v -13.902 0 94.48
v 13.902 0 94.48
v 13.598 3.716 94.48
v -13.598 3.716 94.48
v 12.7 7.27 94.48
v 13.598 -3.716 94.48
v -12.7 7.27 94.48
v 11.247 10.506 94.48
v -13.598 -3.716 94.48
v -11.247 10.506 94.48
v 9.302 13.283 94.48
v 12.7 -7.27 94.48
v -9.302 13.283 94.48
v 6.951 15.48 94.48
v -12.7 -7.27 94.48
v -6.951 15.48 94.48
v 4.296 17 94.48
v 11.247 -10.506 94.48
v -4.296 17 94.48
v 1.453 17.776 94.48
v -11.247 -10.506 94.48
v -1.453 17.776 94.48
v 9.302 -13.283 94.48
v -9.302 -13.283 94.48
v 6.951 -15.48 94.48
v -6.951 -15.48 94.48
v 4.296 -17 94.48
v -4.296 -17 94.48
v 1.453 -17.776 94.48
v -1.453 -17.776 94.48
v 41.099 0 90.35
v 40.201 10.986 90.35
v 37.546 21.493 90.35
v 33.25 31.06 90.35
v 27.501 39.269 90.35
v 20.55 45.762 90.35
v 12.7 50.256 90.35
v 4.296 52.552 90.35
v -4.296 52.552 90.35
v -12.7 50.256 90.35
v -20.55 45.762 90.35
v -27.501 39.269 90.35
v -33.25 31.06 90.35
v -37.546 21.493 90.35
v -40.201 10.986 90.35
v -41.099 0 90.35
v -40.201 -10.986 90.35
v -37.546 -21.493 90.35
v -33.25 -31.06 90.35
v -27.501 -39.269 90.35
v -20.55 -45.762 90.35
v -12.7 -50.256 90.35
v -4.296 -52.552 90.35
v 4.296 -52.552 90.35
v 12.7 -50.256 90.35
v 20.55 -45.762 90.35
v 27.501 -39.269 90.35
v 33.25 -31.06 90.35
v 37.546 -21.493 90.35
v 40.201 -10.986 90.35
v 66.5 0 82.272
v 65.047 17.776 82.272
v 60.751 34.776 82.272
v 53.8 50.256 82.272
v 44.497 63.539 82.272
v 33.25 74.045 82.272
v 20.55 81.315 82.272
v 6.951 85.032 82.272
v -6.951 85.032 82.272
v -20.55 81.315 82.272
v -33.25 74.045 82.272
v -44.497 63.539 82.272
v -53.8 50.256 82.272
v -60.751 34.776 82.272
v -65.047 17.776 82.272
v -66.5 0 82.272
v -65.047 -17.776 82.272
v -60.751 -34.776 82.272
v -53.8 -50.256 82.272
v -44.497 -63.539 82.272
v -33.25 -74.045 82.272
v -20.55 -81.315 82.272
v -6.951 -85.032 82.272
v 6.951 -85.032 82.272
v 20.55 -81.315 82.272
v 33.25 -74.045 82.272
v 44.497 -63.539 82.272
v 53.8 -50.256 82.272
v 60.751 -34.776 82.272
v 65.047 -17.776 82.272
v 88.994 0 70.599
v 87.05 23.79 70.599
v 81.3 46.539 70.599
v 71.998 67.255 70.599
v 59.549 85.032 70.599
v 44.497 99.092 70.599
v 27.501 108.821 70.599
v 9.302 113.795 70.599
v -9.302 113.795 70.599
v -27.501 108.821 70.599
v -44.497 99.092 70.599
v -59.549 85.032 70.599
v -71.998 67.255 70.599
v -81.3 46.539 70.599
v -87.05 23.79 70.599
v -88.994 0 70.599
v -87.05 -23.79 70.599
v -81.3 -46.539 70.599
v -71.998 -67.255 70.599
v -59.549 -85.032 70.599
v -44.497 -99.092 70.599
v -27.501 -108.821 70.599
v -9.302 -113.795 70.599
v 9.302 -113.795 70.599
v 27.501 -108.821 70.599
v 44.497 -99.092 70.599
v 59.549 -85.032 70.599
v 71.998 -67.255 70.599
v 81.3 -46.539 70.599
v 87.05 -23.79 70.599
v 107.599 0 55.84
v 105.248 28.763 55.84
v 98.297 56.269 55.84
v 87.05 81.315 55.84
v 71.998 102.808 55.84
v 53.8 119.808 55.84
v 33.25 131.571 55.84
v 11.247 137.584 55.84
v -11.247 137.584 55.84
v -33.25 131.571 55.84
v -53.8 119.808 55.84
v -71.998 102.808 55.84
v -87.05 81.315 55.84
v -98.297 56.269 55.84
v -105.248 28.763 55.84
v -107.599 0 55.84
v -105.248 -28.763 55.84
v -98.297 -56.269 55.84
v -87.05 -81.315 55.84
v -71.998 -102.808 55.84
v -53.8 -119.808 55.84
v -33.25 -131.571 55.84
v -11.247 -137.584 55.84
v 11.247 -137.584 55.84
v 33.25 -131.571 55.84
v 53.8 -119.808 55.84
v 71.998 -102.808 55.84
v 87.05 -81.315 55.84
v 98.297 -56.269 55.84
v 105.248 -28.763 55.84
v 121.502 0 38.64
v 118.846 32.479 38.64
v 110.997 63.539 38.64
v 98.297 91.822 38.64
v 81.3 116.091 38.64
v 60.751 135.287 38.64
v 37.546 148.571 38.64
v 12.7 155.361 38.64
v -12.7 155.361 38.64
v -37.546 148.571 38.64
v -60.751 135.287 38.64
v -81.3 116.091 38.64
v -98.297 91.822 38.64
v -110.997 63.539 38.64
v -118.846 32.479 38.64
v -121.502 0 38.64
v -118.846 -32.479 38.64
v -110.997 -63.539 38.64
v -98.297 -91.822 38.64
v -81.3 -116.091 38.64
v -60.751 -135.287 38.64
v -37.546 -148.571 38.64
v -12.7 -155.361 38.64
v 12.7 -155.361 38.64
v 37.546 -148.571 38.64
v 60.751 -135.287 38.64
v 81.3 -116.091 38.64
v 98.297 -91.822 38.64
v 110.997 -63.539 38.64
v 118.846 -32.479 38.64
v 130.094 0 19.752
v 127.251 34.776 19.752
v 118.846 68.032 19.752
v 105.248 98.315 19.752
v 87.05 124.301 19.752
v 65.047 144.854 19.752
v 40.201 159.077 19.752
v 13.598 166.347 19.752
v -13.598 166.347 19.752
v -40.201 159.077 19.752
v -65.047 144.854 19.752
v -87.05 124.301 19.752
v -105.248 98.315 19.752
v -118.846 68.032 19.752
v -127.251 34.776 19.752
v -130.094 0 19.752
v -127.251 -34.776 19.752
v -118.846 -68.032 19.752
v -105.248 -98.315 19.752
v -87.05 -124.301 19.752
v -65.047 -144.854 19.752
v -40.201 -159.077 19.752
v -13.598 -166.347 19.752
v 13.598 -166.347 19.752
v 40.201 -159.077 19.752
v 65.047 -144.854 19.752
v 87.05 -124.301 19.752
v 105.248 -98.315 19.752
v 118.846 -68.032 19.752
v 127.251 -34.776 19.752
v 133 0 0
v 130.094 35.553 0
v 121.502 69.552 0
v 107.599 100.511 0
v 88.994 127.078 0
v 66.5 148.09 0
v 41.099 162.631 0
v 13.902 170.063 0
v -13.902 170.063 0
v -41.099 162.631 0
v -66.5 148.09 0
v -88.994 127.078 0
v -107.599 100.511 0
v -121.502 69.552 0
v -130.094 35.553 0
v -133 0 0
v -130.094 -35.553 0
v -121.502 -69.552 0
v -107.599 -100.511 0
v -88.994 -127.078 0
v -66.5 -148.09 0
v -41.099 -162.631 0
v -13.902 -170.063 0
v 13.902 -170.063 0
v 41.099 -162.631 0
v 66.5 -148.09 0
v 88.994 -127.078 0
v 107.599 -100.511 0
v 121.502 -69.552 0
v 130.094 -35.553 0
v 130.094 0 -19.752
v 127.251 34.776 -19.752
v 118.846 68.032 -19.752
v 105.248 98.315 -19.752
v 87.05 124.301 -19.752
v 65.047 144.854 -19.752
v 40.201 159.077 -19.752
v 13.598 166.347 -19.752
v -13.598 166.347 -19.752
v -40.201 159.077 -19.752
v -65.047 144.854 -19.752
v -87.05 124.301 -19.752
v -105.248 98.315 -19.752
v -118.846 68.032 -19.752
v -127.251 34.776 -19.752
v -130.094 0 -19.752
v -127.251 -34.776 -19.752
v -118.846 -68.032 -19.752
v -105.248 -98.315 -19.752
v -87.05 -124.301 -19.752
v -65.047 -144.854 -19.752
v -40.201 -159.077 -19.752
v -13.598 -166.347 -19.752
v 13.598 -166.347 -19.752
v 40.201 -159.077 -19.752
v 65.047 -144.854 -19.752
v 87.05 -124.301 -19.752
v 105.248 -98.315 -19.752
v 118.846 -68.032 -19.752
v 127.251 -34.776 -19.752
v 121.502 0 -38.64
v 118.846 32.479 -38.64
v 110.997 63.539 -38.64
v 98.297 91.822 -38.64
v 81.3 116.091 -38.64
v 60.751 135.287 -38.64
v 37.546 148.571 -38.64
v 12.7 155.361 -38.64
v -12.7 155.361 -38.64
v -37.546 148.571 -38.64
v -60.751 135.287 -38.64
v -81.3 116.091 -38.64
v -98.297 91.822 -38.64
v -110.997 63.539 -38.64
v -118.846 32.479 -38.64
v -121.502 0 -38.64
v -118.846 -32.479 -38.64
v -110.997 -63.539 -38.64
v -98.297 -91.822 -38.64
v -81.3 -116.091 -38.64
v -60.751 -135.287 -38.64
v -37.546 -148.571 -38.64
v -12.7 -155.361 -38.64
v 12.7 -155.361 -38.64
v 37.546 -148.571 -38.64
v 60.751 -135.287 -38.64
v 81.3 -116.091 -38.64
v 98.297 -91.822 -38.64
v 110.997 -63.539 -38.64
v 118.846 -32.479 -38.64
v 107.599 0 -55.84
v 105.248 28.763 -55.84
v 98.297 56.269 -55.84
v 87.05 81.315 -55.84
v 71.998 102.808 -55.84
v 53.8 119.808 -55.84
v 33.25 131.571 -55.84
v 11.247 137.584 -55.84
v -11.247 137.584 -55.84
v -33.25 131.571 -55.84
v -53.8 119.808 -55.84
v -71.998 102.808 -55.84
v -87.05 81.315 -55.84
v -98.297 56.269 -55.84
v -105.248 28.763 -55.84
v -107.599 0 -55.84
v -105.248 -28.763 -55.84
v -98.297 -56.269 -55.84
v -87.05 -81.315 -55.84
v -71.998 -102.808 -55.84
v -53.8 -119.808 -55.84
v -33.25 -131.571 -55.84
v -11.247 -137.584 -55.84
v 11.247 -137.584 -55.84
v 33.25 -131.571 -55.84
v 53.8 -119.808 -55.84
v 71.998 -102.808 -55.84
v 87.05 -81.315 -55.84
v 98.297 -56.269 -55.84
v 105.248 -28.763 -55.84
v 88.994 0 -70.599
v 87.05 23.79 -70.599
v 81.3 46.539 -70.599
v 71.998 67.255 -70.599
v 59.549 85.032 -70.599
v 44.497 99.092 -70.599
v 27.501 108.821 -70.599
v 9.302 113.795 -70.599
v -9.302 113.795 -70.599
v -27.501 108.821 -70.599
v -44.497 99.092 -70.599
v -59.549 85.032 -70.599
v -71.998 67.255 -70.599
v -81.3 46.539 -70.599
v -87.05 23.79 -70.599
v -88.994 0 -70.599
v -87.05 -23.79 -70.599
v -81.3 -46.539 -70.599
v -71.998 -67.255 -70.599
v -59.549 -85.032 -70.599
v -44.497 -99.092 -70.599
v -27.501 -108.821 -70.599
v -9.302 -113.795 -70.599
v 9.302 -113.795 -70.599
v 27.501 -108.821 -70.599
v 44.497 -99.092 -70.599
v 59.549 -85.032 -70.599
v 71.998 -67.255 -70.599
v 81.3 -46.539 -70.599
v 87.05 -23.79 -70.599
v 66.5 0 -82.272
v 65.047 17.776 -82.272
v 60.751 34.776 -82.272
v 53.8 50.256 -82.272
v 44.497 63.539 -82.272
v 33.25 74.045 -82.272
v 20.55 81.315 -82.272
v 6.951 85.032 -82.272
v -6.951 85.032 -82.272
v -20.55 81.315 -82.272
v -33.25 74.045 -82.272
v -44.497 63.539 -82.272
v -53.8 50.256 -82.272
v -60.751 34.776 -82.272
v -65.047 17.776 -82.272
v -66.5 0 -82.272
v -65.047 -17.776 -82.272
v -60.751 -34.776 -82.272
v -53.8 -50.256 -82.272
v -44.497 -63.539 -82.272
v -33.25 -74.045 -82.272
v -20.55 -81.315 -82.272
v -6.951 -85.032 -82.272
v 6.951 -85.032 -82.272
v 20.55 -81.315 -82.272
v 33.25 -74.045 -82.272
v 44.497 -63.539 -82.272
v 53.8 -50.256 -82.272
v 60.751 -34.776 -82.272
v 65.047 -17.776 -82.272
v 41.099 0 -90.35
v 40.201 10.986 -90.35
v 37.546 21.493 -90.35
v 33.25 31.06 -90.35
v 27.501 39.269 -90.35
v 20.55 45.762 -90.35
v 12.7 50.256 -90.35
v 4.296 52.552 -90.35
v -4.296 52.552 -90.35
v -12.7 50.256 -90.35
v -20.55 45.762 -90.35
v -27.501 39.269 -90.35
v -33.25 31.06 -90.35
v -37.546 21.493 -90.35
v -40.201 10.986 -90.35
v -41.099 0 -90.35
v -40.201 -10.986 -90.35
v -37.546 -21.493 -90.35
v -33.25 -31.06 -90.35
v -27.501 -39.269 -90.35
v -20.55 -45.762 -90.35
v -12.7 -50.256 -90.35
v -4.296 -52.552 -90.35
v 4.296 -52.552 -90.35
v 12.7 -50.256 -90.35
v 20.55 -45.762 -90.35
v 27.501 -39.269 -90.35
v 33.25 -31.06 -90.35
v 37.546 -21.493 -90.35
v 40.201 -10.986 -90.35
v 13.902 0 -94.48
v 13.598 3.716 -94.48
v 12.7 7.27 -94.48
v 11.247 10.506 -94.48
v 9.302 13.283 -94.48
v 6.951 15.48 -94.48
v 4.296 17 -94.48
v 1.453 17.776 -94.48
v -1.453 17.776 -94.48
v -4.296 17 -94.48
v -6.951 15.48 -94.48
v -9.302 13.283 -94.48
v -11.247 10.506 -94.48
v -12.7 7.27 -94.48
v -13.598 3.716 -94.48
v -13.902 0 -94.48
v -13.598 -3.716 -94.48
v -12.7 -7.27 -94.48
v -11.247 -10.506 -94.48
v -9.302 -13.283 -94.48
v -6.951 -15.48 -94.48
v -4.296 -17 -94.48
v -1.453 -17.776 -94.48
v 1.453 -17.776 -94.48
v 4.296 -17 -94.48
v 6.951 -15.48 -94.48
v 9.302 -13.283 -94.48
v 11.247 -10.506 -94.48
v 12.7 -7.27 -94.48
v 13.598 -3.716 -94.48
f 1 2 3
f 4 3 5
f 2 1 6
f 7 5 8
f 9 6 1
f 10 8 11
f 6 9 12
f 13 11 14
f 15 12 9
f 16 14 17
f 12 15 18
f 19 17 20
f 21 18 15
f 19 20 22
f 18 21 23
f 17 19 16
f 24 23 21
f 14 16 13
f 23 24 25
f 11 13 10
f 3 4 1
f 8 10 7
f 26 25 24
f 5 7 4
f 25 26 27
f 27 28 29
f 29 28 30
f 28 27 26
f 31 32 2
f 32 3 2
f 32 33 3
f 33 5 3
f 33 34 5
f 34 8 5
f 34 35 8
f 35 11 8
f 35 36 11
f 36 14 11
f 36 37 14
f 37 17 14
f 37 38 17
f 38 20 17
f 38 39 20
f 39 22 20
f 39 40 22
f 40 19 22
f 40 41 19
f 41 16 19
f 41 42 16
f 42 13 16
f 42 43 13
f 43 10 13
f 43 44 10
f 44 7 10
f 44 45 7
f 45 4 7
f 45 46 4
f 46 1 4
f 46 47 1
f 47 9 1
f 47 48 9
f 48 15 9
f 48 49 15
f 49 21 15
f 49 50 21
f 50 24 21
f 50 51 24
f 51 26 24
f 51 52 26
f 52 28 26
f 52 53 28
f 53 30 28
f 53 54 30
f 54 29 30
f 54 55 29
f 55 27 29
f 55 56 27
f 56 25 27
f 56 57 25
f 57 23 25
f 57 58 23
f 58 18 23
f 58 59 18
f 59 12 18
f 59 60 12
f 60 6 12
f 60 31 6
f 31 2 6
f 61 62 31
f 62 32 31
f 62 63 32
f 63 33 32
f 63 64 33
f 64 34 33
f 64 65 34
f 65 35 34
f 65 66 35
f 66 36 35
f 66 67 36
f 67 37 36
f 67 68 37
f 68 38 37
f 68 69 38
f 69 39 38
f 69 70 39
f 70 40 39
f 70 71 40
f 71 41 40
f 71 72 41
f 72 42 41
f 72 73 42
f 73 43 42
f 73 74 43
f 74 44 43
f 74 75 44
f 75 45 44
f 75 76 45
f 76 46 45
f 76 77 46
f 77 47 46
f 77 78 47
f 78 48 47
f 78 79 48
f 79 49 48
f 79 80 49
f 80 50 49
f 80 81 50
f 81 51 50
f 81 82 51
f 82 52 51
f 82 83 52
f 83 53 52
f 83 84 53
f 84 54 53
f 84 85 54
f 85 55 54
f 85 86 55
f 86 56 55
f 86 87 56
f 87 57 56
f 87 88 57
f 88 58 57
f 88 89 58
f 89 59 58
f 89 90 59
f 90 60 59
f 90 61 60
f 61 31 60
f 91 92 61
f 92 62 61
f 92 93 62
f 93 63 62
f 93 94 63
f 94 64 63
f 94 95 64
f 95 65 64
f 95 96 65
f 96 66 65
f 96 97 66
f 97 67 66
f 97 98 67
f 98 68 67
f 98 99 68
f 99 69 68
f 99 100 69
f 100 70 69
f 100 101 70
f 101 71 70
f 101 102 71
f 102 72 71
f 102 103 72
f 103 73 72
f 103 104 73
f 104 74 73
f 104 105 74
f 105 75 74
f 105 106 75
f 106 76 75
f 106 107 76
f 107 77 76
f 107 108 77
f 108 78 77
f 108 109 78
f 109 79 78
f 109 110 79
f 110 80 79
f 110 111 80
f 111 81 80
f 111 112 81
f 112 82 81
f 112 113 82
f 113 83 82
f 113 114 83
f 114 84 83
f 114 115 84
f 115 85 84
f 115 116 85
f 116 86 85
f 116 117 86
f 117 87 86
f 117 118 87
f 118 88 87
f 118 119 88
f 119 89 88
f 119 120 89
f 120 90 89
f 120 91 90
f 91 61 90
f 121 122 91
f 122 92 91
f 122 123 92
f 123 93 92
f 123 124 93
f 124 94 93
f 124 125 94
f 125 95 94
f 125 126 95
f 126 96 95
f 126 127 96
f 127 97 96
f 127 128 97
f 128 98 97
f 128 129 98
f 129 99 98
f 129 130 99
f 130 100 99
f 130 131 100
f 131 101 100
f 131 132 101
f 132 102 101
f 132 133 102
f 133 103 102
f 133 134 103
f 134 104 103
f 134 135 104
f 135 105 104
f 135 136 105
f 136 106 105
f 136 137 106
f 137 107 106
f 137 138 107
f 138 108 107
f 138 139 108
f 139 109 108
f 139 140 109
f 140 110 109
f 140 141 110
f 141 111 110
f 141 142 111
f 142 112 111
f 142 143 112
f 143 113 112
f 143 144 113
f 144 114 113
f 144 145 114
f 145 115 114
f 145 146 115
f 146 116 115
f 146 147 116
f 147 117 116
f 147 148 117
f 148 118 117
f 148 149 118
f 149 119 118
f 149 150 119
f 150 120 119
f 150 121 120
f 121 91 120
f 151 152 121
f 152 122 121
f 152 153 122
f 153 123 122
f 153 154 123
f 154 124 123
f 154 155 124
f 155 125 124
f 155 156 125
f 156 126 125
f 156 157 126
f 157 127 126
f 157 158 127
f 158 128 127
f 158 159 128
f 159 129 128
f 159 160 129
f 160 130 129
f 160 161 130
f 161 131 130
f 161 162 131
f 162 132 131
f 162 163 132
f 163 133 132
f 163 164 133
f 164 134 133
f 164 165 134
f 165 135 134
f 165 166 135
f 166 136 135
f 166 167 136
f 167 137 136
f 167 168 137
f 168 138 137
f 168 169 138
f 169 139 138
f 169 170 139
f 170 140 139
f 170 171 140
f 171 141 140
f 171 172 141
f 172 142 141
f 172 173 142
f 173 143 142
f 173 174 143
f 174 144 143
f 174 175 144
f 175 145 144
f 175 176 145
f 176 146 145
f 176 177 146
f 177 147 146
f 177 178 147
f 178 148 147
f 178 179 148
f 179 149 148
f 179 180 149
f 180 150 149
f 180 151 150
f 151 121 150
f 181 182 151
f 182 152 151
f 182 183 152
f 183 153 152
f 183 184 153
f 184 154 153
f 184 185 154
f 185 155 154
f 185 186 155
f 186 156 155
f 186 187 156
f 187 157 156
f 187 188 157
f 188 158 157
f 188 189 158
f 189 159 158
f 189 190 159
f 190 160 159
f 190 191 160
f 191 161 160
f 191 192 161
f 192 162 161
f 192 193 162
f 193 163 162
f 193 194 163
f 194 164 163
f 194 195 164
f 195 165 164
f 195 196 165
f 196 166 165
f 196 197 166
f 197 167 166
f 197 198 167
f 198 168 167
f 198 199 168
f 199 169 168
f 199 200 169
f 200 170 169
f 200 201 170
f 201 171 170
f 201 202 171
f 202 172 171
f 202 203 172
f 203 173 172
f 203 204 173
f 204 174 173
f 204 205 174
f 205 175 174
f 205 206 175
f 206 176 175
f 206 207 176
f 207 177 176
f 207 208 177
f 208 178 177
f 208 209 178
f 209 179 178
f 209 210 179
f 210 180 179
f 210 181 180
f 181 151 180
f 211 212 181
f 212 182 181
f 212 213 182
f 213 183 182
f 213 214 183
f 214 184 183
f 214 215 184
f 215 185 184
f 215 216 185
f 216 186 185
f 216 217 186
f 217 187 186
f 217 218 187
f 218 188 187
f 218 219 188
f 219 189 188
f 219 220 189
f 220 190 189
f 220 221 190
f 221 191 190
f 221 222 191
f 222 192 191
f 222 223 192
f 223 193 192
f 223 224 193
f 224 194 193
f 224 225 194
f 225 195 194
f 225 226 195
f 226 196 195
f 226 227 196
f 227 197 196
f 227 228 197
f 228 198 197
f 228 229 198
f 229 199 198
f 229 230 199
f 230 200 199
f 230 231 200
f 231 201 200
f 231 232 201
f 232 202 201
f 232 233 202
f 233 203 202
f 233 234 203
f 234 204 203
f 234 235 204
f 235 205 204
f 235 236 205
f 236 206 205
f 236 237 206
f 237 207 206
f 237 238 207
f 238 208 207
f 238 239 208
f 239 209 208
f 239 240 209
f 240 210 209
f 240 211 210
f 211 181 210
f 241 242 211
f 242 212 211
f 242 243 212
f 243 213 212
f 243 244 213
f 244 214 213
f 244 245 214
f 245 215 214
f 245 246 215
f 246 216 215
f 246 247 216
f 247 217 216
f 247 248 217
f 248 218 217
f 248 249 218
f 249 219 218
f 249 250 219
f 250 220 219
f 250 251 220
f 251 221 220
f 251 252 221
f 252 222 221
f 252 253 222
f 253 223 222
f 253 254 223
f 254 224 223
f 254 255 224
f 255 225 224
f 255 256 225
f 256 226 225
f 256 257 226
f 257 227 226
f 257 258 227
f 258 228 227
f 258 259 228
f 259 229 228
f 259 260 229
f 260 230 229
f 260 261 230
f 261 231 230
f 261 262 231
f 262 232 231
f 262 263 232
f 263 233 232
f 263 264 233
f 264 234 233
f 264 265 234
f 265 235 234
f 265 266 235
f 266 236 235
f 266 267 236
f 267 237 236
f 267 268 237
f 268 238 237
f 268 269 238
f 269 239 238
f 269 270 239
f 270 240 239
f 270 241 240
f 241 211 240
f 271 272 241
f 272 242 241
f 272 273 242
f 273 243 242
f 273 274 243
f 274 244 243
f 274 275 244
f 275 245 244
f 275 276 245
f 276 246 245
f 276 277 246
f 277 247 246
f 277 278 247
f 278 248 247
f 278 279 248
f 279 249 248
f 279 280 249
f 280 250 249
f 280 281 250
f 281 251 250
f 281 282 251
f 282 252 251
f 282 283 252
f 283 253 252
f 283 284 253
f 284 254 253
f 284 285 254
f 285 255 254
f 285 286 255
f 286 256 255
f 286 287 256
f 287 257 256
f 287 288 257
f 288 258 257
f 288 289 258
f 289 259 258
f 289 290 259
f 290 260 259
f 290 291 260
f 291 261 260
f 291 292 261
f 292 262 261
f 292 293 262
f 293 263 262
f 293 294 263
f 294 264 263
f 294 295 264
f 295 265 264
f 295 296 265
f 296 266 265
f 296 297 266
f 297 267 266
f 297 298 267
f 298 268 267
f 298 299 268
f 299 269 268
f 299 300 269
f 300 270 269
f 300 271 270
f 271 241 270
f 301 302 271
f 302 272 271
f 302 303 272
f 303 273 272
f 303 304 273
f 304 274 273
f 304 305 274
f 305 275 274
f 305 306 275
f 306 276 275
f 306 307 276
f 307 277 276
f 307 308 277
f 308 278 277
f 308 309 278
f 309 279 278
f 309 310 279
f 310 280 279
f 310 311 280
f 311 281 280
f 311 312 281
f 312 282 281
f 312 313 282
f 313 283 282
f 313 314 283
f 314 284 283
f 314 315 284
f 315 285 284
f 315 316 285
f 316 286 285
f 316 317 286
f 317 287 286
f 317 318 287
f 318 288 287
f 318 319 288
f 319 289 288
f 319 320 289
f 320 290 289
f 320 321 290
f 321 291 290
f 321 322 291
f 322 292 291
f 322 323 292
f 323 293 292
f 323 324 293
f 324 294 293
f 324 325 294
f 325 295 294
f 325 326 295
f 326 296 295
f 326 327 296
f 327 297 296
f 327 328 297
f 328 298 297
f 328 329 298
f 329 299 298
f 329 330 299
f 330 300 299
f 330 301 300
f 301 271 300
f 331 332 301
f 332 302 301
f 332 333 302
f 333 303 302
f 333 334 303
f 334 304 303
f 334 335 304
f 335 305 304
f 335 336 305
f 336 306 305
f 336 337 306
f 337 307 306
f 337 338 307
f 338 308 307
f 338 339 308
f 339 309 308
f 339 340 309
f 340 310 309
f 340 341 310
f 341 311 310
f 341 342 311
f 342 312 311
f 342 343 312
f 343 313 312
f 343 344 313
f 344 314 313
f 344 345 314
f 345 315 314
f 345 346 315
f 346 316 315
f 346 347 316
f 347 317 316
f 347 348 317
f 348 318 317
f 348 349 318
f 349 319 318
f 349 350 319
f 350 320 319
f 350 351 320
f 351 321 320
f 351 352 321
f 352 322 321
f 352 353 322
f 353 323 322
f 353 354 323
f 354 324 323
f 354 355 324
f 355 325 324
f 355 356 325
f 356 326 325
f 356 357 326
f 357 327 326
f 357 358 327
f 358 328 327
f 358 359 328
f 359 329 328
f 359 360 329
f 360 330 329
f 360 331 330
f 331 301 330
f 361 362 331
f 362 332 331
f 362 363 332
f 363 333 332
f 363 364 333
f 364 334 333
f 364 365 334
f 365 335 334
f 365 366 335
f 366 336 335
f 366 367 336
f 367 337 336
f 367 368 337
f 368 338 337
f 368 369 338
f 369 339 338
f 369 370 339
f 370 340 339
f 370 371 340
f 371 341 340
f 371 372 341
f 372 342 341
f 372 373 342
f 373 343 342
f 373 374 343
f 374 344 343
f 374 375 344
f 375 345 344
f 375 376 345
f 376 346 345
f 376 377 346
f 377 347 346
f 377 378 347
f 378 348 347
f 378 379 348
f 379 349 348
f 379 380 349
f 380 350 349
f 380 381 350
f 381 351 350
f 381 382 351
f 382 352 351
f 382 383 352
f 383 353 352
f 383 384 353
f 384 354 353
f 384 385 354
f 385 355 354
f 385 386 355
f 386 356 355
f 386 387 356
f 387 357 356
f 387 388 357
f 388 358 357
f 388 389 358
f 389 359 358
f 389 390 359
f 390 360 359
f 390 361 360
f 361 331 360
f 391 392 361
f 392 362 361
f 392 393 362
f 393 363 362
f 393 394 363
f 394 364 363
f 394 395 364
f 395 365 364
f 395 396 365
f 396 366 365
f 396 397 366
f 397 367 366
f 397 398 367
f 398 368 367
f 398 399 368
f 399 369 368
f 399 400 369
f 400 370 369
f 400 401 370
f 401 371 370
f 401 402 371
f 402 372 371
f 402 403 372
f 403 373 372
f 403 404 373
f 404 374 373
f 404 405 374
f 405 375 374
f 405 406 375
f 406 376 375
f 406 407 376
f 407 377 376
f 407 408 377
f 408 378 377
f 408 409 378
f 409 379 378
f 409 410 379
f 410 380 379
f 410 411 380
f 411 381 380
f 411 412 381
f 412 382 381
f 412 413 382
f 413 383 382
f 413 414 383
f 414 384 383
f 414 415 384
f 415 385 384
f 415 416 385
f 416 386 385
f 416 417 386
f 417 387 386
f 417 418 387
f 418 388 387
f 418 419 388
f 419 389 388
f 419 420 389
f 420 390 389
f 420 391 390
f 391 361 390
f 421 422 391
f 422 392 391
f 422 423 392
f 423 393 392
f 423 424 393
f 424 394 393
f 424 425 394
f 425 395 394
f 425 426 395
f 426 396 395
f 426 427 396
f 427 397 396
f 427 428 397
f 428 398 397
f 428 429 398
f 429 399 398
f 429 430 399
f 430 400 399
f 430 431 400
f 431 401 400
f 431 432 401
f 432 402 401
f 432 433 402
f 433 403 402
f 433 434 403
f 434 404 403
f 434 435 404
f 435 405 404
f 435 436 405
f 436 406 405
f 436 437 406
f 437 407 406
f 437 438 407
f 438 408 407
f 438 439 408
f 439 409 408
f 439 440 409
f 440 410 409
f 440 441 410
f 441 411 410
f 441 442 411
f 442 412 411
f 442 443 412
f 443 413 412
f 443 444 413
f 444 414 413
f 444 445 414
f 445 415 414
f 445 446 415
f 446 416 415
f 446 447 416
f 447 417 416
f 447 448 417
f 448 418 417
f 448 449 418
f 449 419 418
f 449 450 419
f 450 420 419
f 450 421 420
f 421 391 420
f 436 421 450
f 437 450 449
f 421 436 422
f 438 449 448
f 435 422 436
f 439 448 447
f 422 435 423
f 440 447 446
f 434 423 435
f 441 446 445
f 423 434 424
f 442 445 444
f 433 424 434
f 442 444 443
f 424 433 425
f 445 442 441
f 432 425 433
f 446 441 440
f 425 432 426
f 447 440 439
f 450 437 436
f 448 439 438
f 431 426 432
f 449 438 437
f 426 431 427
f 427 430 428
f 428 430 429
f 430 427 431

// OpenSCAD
// Generated by SolidPython 1.0.1 on 2020-07-29 00:46:47


scale(v = [7, 9, 5]) {
	sphere(r = 19);
}
/***********************************************
*********      SolidPython code:      **********
************************************************
 
# import packages: SolidPython
from solid import *
from solid.utils import *
from itertools import chain, combinations, permutations


class Resize:

    def __init__(self, scad_file):
        self.scad_file = scad_file
        #self.scad_file = import_scad(scad_file)
        # cone/cylinder param:
        self.r1 = 0
        self.r2 = 0
        self.h = 0
        # rectangular prism param:
        self.w = 0
        self.l = 0
        # ellipse param:
        self.r = 0

    # import OpenScad code (file name corresponds to shape)


    # classify shape + parameters
    def assign(self, param1, param2, param3):
        if self.scad_file == 'cone.scad':
            self.r1 = param1
            self.r2 = param2
            self.h = param3
        elif self.scad_file == 'cylinder.scad':
            self.r1 = param1
            self.r2 = param2
            self.h = param3
        elif self.scad_file == 'rectangularPrism.scad':
            self.h = param1
            self.l = param2
            self.w = param3
        else:
            self.r = param1
            self.h = param2

    # resize parameters
    def iterate(self):
        x = range(3, 20, 2)
        i = 1
        if self.scad_file == 'cone.scad':
            tempList = list(permutations(x, 2))
            for temp in tempList:
                param1 = temp[0]
                param2 = temp[1]
                filepath = 'produced_scad_files/' + 'cone' + str(param1) + '_' + str(param2) + '_' + '.scad'
                scad_render_to_file(cylinder(h=param1, r1=param2, r2=0), filepath)

        elif self.scad_file == 'cylinder.scad':
            tempList = list(permutations(x, 3))
            for temp in tempList:
                param1 = temp[0]
                param2 = temp[1]
                filepath = 'produced_scad_files/' + 'cylinder' + str(param1) + '_' + str(param2) + '_' + '.scad'
                scad_render_to_file(cylinder(h=param1, r1=param2, r2=param2), filepath)

        elif self.scad_file == 'rectangularPrism.scad':
            tempList = list(permutations(x, 3))
            for temp in tempList:
                param1 = temp[0]
                param2 = temp[1]
                param3 = temp[2]
                filepath = 'produced_scad_files/' + 'rectangularPrism' + str(param1) + '_' + str(param2) + '_' + str(
                    param3) + '.scad'
                scad_render_to_file(cube(size=(param1, param2, param3)), filepath)

        elif self.scad_file == 'ellipse.scad':
            tempList = list(permutations(x, 4))
            for temp in tempList:
                param1 = temp[0]
                param2 = temp[1]
                param3 = temp[2]
                param4 = temp[3]
                filepath = 'produced_scad_files/' + 'ellipse' + str(param1) + '_' + str(param2) + '_' + str(param3) + '_' + str(param4) + '.scad'
                scad_render_to_file(scale([param1, param2, param3])(sphere(r=param4)), filepath)

    def render_to_scadfile(self):
        scad_render_to_file(scad, 'example.scad') 
 
************************************************/
